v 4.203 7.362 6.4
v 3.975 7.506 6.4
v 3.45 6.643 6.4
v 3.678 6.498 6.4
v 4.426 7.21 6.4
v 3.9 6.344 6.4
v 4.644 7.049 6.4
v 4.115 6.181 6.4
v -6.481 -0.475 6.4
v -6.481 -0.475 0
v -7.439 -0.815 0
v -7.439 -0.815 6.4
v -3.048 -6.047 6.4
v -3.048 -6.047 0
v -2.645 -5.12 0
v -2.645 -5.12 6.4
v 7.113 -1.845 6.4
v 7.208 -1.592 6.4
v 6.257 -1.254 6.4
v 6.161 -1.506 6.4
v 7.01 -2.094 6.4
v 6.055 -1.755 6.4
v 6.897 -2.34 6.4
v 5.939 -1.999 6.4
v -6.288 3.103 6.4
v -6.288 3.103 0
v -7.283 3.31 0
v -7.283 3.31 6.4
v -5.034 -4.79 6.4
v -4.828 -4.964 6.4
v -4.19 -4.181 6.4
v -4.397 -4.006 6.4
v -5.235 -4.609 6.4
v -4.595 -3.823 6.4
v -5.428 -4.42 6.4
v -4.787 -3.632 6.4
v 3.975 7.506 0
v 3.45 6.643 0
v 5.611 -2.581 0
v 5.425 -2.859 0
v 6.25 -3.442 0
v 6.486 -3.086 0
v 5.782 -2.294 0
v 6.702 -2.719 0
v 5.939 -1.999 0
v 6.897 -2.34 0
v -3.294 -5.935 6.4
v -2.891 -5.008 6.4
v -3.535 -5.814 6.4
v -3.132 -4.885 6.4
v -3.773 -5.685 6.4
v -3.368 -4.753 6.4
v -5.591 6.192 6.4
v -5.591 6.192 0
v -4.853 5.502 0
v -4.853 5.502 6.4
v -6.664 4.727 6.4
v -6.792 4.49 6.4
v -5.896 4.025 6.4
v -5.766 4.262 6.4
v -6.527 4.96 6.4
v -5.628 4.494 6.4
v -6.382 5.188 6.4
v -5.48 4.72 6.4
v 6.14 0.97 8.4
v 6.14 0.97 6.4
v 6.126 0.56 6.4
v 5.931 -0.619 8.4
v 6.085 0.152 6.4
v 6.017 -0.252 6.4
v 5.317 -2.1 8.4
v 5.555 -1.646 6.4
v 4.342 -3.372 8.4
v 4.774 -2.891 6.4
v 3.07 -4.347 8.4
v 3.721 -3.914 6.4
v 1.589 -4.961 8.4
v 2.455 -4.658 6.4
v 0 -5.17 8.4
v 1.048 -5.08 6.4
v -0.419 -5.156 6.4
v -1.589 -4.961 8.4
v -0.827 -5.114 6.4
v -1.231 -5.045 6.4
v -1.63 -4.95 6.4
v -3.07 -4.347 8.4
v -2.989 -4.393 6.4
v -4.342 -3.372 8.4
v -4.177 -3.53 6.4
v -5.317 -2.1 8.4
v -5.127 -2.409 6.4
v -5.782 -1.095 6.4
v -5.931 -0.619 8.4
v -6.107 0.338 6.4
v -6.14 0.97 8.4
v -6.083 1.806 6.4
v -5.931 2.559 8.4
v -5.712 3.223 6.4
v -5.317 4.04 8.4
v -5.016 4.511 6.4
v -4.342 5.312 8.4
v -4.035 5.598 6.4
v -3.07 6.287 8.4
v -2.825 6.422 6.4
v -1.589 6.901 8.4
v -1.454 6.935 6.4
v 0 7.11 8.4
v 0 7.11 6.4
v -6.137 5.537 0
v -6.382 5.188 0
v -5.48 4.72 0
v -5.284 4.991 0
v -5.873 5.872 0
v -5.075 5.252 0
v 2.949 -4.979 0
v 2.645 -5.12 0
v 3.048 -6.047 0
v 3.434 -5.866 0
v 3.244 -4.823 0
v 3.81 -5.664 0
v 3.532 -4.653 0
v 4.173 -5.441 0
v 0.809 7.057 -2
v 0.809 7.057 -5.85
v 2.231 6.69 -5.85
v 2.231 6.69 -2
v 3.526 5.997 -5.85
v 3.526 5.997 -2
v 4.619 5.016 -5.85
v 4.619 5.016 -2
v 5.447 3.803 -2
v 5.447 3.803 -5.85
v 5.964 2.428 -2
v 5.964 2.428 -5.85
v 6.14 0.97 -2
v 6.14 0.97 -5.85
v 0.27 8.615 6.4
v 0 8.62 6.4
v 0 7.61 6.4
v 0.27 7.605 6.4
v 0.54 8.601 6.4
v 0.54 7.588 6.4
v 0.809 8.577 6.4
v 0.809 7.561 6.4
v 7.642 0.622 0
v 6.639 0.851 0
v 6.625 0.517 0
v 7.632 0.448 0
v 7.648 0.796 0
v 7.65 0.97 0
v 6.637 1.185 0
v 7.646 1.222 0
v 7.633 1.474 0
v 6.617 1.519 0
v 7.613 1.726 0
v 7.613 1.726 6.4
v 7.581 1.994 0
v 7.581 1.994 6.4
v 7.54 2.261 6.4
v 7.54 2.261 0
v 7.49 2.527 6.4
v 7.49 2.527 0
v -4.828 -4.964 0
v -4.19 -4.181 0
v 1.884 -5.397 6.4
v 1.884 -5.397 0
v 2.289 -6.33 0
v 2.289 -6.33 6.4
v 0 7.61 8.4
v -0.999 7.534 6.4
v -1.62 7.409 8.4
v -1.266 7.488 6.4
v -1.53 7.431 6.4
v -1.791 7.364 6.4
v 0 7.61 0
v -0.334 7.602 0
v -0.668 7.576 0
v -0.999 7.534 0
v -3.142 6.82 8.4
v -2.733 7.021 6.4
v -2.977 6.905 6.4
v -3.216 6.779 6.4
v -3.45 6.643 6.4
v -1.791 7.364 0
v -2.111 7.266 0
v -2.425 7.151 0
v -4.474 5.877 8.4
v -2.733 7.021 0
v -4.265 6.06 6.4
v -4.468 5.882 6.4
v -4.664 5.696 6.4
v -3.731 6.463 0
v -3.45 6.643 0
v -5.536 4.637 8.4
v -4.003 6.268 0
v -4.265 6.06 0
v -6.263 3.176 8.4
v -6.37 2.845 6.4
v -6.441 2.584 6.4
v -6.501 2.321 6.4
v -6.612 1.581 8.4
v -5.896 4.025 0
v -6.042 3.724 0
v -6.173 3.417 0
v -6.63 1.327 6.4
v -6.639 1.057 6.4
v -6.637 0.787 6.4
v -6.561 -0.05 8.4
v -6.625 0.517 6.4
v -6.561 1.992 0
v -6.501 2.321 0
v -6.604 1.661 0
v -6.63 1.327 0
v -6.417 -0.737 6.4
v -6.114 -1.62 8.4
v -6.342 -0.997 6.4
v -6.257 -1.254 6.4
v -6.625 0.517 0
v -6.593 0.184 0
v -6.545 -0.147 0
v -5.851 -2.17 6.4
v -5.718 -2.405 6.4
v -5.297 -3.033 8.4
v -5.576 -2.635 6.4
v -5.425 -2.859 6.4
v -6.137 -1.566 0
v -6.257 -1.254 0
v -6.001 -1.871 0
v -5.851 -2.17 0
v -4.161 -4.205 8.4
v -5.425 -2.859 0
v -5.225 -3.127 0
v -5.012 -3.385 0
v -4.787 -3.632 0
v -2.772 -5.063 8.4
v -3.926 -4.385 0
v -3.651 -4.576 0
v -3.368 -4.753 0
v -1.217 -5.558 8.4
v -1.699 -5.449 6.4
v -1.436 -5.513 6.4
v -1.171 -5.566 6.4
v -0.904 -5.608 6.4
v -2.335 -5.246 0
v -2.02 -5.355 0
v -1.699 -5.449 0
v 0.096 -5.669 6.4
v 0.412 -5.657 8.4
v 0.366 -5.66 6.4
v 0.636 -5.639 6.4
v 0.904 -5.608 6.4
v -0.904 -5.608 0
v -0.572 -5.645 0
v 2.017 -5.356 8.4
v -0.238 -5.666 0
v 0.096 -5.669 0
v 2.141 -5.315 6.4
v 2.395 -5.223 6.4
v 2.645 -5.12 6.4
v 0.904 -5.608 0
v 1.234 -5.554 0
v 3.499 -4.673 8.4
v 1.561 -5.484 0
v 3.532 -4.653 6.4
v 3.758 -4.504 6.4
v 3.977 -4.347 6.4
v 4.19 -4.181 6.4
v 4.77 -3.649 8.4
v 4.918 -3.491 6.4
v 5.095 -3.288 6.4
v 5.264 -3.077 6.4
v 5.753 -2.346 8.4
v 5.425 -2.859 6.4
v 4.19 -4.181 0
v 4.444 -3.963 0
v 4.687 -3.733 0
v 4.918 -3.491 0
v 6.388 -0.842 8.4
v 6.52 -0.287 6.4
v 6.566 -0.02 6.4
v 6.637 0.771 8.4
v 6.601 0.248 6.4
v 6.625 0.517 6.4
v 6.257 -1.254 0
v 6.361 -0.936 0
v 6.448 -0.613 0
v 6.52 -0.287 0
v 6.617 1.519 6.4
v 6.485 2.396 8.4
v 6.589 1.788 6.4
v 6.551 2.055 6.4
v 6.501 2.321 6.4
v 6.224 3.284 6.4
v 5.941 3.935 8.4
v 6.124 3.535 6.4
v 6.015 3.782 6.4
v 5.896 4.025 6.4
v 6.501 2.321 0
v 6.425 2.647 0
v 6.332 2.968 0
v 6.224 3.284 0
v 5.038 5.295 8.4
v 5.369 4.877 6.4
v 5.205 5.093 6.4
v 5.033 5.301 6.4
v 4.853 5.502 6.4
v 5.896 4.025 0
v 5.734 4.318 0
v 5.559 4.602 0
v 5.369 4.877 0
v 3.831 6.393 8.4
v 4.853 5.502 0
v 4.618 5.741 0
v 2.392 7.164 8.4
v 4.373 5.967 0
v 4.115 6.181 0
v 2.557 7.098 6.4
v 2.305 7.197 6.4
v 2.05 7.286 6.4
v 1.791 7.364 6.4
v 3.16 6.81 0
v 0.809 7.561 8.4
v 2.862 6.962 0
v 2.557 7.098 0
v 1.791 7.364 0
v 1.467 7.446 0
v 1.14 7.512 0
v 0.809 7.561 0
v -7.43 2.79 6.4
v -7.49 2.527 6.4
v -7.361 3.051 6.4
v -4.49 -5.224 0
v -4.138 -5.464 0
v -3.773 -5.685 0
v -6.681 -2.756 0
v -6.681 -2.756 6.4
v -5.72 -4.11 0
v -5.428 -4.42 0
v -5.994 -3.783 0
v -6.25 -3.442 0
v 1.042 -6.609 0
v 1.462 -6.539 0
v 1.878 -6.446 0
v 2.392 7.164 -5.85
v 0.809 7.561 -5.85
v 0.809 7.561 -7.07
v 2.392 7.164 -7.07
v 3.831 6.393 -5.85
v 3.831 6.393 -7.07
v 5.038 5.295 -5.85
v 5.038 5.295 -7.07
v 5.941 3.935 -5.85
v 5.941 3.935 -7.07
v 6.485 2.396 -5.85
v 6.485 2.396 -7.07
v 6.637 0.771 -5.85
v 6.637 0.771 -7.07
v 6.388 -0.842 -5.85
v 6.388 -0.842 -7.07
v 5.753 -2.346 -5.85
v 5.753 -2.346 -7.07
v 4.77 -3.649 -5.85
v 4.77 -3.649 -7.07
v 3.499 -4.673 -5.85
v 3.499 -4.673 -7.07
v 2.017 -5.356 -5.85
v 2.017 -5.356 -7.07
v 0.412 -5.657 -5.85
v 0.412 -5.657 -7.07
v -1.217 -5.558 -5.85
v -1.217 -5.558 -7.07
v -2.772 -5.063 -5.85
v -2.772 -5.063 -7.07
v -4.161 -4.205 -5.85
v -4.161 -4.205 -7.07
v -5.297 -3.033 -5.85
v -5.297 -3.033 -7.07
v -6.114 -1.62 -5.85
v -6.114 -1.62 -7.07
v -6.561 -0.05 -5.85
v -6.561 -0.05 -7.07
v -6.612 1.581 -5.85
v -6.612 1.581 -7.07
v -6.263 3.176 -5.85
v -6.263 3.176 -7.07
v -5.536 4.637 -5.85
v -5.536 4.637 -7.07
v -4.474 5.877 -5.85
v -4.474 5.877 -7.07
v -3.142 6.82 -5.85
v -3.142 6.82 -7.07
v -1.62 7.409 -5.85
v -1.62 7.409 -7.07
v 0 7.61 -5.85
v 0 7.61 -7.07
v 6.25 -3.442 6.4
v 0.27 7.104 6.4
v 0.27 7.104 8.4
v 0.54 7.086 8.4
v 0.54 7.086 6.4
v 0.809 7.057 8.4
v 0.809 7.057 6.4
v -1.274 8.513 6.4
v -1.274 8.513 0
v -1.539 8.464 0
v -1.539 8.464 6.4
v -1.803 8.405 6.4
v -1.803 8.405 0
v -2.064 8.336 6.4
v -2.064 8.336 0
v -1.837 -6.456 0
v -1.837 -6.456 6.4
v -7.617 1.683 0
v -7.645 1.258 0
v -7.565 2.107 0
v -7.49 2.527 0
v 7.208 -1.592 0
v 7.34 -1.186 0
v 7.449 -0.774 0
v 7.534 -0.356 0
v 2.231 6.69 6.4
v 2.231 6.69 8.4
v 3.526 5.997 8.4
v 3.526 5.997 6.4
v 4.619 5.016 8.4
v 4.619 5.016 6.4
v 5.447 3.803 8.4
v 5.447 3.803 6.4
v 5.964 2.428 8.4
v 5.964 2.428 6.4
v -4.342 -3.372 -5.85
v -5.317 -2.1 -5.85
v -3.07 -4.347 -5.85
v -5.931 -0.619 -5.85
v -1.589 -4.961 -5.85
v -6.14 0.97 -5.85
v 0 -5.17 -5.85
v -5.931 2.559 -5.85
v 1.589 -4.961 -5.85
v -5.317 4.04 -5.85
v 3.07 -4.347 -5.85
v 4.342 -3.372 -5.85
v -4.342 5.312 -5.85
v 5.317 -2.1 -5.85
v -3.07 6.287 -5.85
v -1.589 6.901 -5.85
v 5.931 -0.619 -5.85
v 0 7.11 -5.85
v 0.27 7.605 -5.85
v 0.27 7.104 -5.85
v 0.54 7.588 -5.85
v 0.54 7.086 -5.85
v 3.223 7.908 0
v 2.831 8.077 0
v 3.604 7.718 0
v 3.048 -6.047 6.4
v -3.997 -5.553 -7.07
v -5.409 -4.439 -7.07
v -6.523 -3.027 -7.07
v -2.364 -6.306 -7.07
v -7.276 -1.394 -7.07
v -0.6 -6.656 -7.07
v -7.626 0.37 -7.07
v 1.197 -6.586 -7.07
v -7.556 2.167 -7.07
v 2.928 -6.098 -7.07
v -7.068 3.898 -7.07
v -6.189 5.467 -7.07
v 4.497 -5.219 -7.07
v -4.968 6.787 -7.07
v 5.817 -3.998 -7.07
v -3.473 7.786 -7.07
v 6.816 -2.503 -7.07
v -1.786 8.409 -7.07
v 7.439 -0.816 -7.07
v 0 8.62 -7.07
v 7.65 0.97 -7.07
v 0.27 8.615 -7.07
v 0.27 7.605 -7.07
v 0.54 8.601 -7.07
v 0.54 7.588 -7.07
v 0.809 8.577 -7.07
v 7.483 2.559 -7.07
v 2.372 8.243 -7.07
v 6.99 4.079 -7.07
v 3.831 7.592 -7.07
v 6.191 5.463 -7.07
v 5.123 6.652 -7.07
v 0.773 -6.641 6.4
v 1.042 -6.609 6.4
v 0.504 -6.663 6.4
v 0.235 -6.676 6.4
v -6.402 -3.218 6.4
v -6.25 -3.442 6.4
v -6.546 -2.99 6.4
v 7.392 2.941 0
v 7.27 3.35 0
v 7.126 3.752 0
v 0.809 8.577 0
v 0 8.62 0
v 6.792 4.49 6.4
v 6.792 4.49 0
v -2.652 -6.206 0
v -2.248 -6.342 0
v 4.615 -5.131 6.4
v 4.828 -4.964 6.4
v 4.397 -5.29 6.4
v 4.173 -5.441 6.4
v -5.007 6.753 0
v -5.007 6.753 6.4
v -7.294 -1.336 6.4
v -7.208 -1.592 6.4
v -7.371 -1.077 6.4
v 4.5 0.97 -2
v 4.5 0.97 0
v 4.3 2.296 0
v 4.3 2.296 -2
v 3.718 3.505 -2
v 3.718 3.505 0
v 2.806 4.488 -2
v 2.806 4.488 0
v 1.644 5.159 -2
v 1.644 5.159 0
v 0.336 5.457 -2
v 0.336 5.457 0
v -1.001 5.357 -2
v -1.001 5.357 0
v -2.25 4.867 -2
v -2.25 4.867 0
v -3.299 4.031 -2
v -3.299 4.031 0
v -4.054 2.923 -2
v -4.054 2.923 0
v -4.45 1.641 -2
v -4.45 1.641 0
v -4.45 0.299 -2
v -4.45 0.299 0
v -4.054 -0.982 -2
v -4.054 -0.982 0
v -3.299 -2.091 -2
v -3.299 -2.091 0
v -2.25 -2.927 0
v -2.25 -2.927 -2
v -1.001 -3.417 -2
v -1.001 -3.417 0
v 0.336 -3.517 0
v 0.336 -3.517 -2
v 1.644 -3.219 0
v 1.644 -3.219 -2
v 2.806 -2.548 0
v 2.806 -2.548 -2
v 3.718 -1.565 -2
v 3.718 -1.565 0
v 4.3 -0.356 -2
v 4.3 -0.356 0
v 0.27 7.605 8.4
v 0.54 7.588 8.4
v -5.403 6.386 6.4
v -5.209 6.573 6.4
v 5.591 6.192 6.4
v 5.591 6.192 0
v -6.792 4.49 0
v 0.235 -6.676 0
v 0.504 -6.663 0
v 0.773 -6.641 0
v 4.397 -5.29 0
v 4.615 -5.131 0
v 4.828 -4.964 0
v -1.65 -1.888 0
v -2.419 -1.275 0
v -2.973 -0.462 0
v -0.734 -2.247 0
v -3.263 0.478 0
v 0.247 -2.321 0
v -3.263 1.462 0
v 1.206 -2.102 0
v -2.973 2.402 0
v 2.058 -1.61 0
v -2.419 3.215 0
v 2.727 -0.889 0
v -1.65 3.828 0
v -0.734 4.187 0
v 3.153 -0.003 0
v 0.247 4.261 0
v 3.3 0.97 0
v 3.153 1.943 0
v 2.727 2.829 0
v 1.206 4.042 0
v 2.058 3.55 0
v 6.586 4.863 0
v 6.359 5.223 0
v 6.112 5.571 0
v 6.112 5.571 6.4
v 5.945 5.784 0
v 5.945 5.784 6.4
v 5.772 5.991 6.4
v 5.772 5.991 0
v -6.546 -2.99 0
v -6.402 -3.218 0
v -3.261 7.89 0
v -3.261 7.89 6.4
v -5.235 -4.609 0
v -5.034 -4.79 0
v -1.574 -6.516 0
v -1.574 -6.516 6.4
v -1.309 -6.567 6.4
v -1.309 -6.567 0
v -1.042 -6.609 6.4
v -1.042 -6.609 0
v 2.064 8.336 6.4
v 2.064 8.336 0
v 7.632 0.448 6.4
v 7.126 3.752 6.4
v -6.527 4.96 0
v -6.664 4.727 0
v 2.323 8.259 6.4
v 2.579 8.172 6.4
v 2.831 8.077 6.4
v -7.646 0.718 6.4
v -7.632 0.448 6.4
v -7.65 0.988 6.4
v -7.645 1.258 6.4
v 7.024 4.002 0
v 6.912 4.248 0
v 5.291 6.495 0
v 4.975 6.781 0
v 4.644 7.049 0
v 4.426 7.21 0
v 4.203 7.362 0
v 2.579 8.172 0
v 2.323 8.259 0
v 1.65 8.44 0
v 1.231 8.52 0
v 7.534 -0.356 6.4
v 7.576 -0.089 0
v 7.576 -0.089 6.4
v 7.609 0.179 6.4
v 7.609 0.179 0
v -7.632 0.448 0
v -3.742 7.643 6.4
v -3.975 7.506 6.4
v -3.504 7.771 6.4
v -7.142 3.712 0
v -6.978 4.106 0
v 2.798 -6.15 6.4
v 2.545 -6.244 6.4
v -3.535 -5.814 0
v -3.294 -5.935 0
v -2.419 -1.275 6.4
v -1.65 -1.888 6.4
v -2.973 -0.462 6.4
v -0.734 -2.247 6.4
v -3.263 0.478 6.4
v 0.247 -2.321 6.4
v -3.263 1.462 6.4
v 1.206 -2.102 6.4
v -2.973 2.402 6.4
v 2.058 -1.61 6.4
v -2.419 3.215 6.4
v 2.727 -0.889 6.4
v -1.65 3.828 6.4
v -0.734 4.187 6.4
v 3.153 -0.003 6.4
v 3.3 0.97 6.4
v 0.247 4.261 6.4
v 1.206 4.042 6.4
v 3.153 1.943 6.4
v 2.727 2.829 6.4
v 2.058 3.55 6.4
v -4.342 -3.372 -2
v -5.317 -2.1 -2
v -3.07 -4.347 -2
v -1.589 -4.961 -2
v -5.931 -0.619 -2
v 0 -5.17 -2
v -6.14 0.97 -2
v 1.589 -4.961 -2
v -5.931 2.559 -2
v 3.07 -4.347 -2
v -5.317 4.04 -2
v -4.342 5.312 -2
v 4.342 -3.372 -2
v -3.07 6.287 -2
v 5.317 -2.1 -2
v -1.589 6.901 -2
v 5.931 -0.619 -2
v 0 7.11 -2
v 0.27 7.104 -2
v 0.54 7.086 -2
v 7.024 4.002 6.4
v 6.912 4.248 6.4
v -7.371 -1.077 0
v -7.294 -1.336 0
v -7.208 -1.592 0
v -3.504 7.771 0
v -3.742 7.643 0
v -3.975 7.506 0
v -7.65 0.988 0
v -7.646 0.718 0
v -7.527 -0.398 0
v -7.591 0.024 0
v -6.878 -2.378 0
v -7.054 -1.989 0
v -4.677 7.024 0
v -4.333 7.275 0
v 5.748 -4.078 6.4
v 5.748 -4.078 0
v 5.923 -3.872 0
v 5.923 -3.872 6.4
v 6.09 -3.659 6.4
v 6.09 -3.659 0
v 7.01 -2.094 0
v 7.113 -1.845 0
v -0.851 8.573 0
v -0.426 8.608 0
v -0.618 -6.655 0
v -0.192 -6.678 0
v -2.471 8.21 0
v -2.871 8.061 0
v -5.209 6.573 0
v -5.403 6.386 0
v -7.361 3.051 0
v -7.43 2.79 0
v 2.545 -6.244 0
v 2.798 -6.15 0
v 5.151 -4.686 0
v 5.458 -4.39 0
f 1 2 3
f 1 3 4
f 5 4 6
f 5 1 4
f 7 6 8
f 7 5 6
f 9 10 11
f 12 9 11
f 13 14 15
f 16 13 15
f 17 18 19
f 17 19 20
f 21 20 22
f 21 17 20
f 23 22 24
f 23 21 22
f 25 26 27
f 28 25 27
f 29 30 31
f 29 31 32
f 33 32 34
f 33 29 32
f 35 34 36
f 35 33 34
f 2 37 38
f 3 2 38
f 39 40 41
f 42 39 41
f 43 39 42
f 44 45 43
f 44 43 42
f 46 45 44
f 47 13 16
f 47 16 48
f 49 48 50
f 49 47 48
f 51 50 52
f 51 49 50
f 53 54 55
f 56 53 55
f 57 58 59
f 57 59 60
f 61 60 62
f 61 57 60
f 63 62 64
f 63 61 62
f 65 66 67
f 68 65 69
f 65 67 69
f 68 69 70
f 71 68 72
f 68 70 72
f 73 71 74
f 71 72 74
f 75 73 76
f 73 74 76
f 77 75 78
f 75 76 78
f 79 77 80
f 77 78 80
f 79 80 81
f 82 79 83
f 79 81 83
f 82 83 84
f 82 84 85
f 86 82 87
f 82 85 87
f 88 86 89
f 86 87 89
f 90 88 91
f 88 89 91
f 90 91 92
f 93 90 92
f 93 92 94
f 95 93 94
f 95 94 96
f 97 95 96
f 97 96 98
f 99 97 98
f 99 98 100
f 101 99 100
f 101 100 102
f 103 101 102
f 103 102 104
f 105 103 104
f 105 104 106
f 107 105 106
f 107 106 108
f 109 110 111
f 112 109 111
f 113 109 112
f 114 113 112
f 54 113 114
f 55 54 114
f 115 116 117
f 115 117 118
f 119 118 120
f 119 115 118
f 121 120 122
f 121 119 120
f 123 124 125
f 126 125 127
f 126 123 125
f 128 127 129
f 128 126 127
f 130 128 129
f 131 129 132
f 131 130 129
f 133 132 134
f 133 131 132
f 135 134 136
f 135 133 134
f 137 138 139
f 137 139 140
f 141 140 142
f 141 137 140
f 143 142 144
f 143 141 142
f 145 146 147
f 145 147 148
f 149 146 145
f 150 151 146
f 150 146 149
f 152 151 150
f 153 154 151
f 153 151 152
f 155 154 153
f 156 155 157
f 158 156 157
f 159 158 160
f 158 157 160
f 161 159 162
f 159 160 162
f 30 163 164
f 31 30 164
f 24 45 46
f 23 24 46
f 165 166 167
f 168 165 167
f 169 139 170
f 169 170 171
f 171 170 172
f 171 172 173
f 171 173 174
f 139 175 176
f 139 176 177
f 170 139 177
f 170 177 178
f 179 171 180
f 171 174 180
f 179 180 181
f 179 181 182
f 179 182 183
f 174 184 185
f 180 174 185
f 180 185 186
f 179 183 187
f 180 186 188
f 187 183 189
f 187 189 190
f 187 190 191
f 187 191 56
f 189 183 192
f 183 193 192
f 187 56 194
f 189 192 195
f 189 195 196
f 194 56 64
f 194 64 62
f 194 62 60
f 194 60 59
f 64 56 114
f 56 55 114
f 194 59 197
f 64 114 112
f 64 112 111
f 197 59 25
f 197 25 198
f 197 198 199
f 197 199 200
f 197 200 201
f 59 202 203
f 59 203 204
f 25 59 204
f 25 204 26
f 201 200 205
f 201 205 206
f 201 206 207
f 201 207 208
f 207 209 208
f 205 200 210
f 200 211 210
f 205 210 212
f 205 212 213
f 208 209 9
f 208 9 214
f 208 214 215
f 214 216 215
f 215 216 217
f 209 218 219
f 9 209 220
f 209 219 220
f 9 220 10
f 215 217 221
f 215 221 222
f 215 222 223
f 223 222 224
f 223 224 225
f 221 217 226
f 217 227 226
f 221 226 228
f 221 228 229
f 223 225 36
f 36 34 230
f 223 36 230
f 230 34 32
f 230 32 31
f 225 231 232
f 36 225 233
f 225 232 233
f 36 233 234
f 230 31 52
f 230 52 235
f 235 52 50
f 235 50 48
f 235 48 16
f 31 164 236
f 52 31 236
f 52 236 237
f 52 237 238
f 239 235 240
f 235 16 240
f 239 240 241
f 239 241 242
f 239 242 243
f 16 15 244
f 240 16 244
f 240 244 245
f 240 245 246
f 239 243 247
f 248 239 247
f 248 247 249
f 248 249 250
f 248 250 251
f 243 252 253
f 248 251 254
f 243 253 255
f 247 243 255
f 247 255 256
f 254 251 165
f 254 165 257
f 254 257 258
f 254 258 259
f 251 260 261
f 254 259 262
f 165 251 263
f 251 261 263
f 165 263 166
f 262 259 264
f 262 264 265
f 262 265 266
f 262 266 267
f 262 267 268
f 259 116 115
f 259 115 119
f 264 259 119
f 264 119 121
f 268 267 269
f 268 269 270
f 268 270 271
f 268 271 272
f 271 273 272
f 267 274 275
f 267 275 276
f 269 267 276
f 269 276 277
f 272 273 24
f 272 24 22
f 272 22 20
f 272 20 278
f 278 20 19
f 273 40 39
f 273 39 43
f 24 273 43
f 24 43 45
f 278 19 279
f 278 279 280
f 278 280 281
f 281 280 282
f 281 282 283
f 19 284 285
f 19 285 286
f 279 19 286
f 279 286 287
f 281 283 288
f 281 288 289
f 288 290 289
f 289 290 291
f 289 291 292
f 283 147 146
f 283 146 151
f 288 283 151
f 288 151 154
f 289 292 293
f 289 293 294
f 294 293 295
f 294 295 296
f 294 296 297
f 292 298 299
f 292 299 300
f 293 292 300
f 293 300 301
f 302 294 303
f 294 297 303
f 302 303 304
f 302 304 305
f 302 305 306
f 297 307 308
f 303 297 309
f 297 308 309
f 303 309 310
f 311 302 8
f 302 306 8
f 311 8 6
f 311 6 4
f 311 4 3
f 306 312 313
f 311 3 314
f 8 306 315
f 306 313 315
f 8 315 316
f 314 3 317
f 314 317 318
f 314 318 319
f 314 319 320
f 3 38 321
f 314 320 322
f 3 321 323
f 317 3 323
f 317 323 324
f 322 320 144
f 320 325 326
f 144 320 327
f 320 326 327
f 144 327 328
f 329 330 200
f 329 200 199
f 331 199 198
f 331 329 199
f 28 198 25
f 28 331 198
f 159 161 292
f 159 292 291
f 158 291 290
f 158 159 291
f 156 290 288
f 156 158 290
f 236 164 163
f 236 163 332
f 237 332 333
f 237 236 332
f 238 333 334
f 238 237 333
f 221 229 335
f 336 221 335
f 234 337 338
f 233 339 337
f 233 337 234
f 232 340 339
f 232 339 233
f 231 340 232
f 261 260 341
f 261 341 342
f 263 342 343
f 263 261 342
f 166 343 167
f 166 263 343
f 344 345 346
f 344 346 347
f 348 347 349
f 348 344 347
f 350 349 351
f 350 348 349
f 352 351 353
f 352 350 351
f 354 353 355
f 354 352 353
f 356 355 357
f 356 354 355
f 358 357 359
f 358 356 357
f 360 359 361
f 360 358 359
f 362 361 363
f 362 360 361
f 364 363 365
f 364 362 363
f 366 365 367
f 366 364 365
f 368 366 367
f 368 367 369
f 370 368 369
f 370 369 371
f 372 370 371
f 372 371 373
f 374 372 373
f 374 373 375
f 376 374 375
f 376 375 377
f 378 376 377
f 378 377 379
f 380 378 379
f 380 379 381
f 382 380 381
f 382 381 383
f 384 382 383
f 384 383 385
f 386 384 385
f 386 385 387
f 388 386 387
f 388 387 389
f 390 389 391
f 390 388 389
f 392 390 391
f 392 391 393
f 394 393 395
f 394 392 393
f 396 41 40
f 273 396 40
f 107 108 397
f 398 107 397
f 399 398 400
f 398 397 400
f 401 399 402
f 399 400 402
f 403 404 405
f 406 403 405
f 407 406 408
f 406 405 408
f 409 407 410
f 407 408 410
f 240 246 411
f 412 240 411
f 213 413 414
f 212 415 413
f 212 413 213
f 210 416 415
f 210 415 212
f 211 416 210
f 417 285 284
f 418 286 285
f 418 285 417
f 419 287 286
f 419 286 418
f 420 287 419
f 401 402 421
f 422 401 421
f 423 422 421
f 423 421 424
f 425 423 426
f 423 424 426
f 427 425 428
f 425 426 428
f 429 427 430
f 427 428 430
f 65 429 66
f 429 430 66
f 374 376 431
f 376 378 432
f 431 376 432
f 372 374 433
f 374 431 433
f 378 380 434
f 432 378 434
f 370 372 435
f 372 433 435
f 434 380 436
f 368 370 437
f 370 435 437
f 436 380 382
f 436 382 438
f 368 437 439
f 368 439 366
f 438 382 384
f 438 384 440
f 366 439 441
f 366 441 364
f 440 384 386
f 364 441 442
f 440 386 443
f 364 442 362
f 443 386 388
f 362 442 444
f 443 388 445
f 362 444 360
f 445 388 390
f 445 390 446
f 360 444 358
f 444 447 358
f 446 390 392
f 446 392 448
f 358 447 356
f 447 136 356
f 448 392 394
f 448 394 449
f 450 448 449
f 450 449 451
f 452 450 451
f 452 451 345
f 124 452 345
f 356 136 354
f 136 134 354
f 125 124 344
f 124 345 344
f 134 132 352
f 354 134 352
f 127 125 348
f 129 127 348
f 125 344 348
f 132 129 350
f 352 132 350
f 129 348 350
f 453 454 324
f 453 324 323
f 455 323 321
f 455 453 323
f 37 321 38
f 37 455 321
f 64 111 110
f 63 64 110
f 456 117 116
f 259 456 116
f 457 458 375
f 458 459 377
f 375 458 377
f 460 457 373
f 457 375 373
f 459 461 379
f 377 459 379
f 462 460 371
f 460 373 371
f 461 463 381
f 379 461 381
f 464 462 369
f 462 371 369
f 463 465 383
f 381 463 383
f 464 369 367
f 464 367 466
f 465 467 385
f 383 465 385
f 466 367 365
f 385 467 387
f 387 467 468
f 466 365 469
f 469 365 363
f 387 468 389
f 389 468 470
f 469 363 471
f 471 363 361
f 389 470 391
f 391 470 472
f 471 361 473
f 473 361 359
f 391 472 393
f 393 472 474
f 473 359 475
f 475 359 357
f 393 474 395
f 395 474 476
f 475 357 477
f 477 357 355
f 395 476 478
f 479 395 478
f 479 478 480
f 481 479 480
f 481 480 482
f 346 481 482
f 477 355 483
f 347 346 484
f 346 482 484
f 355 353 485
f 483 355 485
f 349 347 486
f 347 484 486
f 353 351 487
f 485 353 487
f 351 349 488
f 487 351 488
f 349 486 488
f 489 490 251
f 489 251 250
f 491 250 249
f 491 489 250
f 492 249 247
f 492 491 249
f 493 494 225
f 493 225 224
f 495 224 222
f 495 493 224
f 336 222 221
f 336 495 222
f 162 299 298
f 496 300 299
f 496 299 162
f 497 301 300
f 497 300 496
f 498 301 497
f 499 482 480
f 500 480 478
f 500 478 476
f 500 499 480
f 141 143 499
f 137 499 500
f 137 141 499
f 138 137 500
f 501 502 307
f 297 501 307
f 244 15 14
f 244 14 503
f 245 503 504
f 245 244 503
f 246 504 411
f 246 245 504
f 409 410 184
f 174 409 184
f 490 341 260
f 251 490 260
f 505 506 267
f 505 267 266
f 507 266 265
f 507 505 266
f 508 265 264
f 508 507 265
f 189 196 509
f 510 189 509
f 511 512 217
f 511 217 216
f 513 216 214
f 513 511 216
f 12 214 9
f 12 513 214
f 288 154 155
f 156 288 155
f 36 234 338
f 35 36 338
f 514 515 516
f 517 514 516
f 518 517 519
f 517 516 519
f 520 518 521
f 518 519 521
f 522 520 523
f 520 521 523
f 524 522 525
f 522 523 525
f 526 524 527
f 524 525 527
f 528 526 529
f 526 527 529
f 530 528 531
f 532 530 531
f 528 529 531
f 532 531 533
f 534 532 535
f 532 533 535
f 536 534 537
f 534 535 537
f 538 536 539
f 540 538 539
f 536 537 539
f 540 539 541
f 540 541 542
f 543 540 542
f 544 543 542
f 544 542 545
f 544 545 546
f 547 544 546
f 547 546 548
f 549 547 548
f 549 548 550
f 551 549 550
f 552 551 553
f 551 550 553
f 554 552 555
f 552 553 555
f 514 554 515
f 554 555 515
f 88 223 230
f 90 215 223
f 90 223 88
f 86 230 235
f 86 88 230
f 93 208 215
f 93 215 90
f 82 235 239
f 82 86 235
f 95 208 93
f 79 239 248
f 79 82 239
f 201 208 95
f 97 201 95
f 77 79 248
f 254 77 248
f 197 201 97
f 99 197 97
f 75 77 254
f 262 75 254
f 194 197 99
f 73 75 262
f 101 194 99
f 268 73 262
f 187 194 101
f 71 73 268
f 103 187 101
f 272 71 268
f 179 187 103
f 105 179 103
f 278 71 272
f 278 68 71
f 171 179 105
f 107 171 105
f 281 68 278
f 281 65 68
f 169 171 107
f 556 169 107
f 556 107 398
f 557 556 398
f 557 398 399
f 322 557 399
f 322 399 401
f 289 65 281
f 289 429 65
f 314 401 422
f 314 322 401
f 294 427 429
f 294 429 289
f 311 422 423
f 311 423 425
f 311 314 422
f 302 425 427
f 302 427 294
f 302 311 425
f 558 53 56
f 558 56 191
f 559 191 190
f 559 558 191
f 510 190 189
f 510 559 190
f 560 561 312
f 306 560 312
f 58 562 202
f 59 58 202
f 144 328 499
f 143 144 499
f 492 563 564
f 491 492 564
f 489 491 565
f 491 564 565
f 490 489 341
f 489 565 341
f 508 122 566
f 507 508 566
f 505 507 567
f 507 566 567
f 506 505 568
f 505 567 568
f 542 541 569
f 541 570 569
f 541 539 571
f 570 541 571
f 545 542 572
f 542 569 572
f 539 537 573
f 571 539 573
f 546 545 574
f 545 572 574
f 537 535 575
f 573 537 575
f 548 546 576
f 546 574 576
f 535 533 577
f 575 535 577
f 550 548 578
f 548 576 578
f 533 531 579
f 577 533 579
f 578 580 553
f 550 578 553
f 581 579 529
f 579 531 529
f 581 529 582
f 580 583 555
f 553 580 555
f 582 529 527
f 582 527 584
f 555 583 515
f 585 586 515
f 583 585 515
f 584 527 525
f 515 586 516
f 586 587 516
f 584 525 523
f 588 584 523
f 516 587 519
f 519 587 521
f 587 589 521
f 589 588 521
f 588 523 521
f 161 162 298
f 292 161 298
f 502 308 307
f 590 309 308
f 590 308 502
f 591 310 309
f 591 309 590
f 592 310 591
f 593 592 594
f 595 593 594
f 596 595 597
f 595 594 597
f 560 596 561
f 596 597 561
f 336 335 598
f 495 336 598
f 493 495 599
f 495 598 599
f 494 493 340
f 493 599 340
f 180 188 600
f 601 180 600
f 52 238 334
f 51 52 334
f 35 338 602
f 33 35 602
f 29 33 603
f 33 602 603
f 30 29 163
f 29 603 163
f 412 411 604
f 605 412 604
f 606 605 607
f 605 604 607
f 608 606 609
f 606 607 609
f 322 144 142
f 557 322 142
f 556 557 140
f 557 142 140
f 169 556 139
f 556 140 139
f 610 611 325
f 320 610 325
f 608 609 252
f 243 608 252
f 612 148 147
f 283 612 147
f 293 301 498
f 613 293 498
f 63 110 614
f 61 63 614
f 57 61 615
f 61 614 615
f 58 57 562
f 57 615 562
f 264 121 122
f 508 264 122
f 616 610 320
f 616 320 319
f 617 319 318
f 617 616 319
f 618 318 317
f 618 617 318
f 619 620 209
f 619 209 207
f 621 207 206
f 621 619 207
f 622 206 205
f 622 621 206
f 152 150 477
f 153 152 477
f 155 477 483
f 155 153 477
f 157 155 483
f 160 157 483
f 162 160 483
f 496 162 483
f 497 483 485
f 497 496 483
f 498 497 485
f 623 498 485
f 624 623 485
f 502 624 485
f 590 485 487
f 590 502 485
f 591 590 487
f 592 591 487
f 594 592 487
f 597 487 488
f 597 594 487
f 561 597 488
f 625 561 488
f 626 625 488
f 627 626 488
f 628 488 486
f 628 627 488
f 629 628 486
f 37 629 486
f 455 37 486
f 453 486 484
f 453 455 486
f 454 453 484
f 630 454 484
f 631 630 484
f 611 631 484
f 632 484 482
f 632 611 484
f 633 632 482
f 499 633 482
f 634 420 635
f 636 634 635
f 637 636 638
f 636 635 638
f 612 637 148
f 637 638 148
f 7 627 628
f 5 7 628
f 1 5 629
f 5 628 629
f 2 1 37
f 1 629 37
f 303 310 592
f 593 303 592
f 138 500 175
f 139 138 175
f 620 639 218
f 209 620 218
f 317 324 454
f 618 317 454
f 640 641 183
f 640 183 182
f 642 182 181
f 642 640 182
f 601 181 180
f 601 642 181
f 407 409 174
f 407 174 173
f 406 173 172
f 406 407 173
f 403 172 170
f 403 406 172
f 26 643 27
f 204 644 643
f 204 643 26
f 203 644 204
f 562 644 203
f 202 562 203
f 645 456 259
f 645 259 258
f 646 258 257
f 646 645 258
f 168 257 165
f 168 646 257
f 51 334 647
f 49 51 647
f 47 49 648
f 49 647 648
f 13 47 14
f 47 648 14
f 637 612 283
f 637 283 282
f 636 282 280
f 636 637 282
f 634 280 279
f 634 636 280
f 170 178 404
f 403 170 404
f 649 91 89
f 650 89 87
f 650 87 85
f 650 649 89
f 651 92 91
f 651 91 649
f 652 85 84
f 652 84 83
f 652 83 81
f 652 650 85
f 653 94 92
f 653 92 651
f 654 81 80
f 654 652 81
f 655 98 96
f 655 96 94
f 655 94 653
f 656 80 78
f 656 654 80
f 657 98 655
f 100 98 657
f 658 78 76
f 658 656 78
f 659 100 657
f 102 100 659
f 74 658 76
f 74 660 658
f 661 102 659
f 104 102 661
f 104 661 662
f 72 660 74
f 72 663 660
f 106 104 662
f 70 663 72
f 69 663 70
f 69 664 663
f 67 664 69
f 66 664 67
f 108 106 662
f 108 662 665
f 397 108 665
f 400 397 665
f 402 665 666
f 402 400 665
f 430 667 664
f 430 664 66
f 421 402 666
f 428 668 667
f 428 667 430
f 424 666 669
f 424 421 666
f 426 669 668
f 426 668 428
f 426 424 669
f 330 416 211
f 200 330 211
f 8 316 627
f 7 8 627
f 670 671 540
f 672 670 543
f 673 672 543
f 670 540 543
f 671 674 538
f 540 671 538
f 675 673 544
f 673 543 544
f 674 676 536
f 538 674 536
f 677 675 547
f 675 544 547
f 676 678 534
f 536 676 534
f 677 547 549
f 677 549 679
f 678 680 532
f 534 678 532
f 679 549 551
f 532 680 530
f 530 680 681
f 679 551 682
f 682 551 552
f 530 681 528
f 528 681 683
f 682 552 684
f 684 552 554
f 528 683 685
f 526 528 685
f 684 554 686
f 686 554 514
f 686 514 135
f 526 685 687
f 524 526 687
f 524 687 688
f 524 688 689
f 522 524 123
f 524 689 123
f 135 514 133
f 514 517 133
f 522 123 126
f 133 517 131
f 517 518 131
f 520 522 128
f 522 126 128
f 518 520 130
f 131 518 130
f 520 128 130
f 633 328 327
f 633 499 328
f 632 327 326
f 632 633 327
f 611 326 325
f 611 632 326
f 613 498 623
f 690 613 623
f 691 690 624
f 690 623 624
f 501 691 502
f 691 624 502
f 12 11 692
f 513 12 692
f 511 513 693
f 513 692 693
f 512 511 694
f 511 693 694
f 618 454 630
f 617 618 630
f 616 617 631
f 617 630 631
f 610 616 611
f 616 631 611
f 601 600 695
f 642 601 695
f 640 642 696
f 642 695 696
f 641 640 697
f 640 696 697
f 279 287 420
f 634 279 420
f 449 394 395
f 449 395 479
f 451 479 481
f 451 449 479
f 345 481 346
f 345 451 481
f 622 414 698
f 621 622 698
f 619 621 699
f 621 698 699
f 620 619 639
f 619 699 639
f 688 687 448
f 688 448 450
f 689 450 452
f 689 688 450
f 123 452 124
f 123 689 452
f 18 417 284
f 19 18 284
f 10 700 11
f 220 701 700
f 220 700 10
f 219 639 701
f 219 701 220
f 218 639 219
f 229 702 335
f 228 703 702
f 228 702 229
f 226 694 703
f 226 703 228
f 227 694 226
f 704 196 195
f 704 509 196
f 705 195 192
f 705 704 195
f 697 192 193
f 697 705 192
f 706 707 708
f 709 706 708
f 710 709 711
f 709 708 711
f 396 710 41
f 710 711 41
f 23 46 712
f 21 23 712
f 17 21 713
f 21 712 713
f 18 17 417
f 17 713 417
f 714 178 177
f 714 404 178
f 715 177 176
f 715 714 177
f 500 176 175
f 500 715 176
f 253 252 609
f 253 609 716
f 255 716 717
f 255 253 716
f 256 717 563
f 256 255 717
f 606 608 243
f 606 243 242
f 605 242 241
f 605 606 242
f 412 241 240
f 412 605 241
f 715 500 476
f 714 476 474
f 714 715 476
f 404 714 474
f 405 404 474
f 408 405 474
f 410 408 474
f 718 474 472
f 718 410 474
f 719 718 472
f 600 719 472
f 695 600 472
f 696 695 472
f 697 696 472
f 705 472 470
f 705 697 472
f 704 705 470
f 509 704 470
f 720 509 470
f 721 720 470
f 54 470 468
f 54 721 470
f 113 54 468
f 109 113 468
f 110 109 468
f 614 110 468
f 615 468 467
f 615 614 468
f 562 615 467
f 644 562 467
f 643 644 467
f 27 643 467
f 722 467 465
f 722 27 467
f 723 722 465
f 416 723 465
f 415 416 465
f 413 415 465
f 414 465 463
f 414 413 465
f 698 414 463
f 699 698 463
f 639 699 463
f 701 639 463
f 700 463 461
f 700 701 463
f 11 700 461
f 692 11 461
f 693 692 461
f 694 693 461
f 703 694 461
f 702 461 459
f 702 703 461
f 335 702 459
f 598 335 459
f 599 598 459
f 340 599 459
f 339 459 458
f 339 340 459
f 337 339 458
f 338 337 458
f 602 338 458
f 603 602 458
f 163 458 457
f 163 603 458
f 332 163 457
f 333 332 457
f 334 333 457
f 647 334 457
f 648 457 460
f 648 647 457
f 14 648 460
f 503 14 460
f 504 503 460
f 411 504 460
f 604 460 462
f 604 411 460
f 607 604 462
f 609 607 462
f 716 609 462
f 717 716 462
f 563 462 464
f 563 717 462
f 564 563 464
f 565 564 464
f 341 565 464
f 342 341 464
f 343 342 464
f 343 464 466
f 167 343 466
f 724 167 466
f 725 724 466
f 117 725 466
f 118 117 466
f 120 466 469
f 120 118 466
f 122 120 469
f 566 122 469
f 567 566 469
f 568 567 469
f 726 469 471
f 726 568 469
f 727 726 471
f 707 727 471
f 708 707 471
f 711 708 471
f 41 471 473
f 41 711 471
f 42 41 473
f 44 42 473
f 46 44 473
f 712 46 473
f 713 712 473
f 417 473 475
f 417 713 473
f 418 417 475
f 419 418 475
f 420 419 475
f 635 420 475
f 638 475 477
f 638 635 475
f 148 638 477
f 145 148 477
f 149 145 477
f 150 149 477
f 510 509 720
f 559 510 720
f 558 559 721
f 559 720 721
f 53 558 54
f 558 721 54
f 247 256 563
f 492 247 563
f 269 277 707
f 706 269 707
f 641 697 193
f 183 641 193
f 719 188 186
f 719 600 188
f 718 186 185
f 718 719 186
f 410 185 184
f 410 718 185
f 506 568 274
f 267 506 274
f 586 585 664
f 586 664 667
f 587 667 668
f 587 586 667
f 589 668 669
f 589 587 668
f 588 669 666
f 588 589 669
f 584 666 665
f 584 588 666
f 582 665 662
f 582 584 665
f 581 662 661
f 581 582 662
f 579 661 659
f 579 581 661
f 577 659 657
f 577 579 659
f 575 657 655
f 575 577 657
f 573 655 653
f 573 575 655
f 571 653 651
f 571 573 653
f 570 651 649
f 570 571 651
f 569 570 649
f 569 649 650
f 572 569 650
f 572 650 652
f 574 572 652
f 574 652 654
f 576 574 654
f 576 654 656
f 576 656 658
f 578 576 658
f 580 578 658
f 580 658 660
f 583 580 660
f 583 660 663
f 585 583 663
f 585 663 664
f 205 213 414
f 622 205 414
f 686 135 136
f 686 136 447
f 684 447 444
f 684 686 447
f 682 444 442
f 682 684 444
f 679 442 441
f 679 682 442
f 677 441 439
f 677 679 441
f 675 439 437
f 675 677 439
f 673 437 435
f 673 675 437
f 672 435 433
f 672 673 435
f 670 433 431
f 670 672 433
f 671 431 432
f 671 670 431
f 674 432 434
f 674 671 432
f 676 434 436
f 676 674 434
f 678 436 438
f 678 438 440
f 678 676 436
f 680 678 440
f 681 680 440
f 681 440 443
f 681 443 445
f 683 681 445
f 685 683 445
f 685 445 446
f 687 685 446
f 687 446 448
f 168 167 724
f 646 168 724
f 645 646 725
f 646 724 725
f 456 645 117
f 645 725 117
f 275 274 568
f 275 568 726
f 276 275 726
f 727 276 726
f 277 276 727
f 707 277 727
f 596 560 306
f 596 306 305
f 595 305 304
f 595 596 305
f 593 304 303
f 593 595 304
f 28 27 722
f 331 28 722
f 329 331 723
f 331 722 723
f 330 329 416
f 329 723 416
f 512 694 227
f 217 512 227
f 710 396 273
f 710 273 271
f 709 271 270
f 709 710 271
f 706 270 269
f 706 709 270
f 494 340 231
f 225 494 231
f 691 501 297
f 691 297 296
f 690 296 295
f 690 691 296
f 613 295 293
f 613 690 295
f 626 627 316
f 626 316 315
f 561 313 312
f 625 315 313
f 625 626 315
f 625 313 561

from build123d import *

# Parameters (mm, degrees)
F0_R     = 4.5
F0_R_2   = 3.3
F1_DEPTH = 6.4
F2_DEPTH = 8.4
F4_COUNT = 23
F5_DEPTH = 2
F6_DEPTH = 5.85
F7_DEPTH = 7.07


with BuildPart() as f1:
    # F0 (on Top) → F1 (new body)
    with BuildSketch(Plane.XY):
        with BuildLine():
            ThreePointArc((0, 7.1100645757), (-4.3416356365, -3.3715710607), (6.14, 0.9700645757))
            ThreePointArc((6.14, 0.9700645757), (4.6187674474, 5.0156284755), (0.8088640824, 7.0565527994))
            ThreePointArc((0.8088640824, 7.0565527994), (0.4053161155, 7.0966720257), (0, 7.1100645757))
        make_face()
        with Locations((0, 0.9700645757)):
            Circle(F0_R, mode=Mode.SUBTRACT)
        with Locations((0, 0.9700645757)):
            Circle(F0_R)
        with Locations((0, 0.9700645757)):
            Circle(F0_R_2, mode=Mode.SUBTRACT)
        with BuildLine():
            ThreePointArc((0, 7.6100645757), (0.4051871433, 7.5976903481), (0.8088640824, 7.5606137863))
            Line((0.8088640824, 7.5606137863), (0.8088640824, 8.3760242635))
            ThreePointArc((0.8088640824, 8.3760242635), (0.4050310645, 8.4090463499), (0, 8.4200645757))
            Line((0, 8.4200645757), (0, 7.6100645757))
        make_face()
        with BuildLine():
            ThreePointArc((0, 7.1100645757), (0.4053161155, 7.0966720257), (0.8088640824, 7.0565527994))
            Line((0.8088640824, 7.0565527994), (0.8088640824, 7.5606137863))
            ThreePointArc((0.8088640824, 7.5606137863), (0.4051871433, 7.5976903481), (0, 7.6100645757))
            Line((0, 7.6100645757), (0, 7.1100645757))
        make_face()
        with BuildLine():
            ThreePointArc((0, 8.4200645757), (0.4050310645, 8.4090463499), (0.8088640824, 8.3760242635))
            Line((0.8088640824, 8.3760242635), (0.8088640824, 8.5771822228))
            ThreePointArc((0.8088640824, 8.5771822228), (0.405, 8.6093364651), (0, 8.6200645757))
            Line((0, 8.6200645757), (0, 8.4200645757))
        make_face()
    extrude(amount=F1_DEPTH)



with BuildPart() as f2:
    # F0 (on Top) → F2 (new body)
    with BuildSketch(Plane.XY):
        with BuildLine():
            ThreePointArc((0.8088640824, 7.0565527994), (4.6187674474, 5.0156284755), (6.14, 0.9700645757))
            ThreePointArc((6.14, 0.9700645757), (-4.3416356365, -3.3715710607), (0, 7.1100645757))
            Line((0, 7.1100645757), (0, 7.6100645757))
            ThreePointArc((0, 7.6100645757), (-4.6951890271, -3.7251244513), (6.64, 0.9700645757))
            ThreePointArc((6.64, 0.9700645757), (4.9729497035, 5.3699931259), (0.8088640824, 7.5606137863))
            Line((0.8088640824, 7.5606137863), (0.8088640824, 7.0565527994))
        make_face()
        with BuildLine():
            ThreePointArc((0, 7.1100645757), (0.4053161155, 7.0966720257), (0.8088640824, 7.0565527994))
            Line((0.8088640824, 7.0565527994), (0.8088640824, 7.5606137863))
            ThreePointArc((0.8088640824, 7.5606137863), (0.4051871433, 7.5976903481), (0, 7.6100645757))
            Line((0, 7.6100645757), (0, 7.1100645757))
        make_face()
    extrude(amount=F2_DEPTH)


with BuildPart() as f1_1:
    add(f1.part)

    add(f2.part)  # F4 merges F2
    # F4: F1 ×23 about axis
    f4_axis = Axis((0, 0.9700645757, -1.082088449), (0, 0, -1))
    for i in range(1, F4_COUNT):
        add(f1.part.rotate(f4_axis, i * 360 / F4_COUNT))

    # F0 (on Top) → F5 (join)
    with BuildSketch(Plane.XY):
        with BuildLine():
            ThreePointArc((0, 7.1100645757), (-4.3416356365, -3.3715710607), (6.14, 0.9700645757))
            ThreePointArc((6.14, 0.9700645757), (4.6187674474, 5.0156284755), (0.8088640824, 7.0565527994))
            ThreePointArc((0.8088640824, 7.0565527994), (0.4053161155, 7.0966720257), (0, 7.1100645757))
        make_face()
        with Locations((0, 0.9700645757)):
            Circle(F0_R, mode=Mode.SUBTRACT)
    extrude(amount=-F5_DEPTH)

    # F0 (on Top) → F6 (join)
    with BuildSketch(Plane.XY):
        with BuildLine():
            ThreePointArc((0.8088640824, 7.0565527994), (4.6187674474, 5.0156284755), (6.14, 0.9700645757))
            ThreePointArc((6.14, 0.9700645757), (-4.3416356365, -3.3715710607), (0, 7.1100645757))
            Line((0, 7.1100645757), (0, 7.6100645757))
            ThreePointArc((0, 7.6100645757), (-4.6951890271, -3.7251244513), (6.64, 0.9700645757))
            ThreePointArc((6.64, 0.9700645757), (4.9729497035, 5.3699931259), (0.8088640824, 7.5606137863))
            Line((0.8088640824, 7.5606137863), (0.8088640824, 7.0565527994))
        make_face()
        with BuildLine():
            ThreePointArc((0, 7.1100645757), (0.4053161155, 7.0966720257), (0.8088640824, 7.0565527994))
            Line((0.8088640824, 7.0565527994), (0.8088640824, 7.5606137863))
            ThreePointArc((0.8088640824, 7.5606137863), (0.4051871433, 7.5976903481), (0, 7.6100645757))
            Line((0, 7.6100645757), (0, 7.1100645757))
        make_face()
    extrude(amount=-F6_DEPTH)

    # F0 (on Top) → F7 (join)
    with BuildSketch(Plane.XY):
        with BuildLine():
            Line((0.8088640824, 8.3760242635), (0.8088640824, 7.5606137863))
            ThreePointArc((0.8088640824, 7.5606137863), (4.9729497035, 5.3699931259), (6.64, 0.9700645757))
            ThreePointArc((6.64, 0.9700645757), (-4.6951890271, -3.7251244513), (0, 7.6100645757))
            Line((0, 7.6100645757), (0, 8.4200645757))
            ThreePointArc((0, 8.4200645757), (-5.2679455198, -4.2978809441), (7.45, 0.9700645757))
            ThreePointArc((7.45, 0.9700645757), (5.54655467, 5.9438188211), (0.8088640824, 8.3760242635))
        make_face()
        with BuildLine():
            Line((0.8088640824, 8.5771822228), (0.8088640824, 8.3760242635))
            ThreePointArc((0.8088640824, 8.3760242635), (5.54655467, 5.9438188211), (7.45, 0.9700645757))
            ThreePointArc((7.45, 0.9700645757), (-5.2679455198, -4.2978809441), (0, 8.4200645757))
            Line((0, 8.4200645757), (0, 8.6200645757))
            ThreePointArc((0, 8.6200645757), (-5.4093668761, -4.4393023003), (7.65, 0.9700645757))
            ThreePointArc((7.65, 0.9700645757), (5.6881592027, 6.0854672857), (0.8088640824, 8.5771822228))
        make_face()
        with BuildLine():
            ThreePointArc((0, 7.6100645757), (0.4051871433, 7.5976903481), (0.8088640824, 7.5606137863))
            Line((0.8088640824, 7.5606137863), (0.8088640824, 8.3760242635))
            ThreePointArc((0.8088640824, 8.3760242635), (0.4050310645, 8.4090463499), (0, 8.4200645757))
            Line((0, 8.4200645757), (0, 7.6100645757))
        make_face()
        with BuildLine():
            ThreePointArc((0, 8.4200645757), (0.4050310645, 8.4090463499), (0.8088640824, 8.3760242635))
            Line((0.8088640824, 8.3760242635), (0.8088640824, 8.5771822228))
            ThreePointArc((0.8088640824, 8.5771822228), (0.405, 8.6093364651), (0, 8.6200645757))
            Line((0, 8.6200645757), (0, 8.4200645757))
        make_face()
    extrude(amount=-F7_DEPTH)


solid = f1_1.part
